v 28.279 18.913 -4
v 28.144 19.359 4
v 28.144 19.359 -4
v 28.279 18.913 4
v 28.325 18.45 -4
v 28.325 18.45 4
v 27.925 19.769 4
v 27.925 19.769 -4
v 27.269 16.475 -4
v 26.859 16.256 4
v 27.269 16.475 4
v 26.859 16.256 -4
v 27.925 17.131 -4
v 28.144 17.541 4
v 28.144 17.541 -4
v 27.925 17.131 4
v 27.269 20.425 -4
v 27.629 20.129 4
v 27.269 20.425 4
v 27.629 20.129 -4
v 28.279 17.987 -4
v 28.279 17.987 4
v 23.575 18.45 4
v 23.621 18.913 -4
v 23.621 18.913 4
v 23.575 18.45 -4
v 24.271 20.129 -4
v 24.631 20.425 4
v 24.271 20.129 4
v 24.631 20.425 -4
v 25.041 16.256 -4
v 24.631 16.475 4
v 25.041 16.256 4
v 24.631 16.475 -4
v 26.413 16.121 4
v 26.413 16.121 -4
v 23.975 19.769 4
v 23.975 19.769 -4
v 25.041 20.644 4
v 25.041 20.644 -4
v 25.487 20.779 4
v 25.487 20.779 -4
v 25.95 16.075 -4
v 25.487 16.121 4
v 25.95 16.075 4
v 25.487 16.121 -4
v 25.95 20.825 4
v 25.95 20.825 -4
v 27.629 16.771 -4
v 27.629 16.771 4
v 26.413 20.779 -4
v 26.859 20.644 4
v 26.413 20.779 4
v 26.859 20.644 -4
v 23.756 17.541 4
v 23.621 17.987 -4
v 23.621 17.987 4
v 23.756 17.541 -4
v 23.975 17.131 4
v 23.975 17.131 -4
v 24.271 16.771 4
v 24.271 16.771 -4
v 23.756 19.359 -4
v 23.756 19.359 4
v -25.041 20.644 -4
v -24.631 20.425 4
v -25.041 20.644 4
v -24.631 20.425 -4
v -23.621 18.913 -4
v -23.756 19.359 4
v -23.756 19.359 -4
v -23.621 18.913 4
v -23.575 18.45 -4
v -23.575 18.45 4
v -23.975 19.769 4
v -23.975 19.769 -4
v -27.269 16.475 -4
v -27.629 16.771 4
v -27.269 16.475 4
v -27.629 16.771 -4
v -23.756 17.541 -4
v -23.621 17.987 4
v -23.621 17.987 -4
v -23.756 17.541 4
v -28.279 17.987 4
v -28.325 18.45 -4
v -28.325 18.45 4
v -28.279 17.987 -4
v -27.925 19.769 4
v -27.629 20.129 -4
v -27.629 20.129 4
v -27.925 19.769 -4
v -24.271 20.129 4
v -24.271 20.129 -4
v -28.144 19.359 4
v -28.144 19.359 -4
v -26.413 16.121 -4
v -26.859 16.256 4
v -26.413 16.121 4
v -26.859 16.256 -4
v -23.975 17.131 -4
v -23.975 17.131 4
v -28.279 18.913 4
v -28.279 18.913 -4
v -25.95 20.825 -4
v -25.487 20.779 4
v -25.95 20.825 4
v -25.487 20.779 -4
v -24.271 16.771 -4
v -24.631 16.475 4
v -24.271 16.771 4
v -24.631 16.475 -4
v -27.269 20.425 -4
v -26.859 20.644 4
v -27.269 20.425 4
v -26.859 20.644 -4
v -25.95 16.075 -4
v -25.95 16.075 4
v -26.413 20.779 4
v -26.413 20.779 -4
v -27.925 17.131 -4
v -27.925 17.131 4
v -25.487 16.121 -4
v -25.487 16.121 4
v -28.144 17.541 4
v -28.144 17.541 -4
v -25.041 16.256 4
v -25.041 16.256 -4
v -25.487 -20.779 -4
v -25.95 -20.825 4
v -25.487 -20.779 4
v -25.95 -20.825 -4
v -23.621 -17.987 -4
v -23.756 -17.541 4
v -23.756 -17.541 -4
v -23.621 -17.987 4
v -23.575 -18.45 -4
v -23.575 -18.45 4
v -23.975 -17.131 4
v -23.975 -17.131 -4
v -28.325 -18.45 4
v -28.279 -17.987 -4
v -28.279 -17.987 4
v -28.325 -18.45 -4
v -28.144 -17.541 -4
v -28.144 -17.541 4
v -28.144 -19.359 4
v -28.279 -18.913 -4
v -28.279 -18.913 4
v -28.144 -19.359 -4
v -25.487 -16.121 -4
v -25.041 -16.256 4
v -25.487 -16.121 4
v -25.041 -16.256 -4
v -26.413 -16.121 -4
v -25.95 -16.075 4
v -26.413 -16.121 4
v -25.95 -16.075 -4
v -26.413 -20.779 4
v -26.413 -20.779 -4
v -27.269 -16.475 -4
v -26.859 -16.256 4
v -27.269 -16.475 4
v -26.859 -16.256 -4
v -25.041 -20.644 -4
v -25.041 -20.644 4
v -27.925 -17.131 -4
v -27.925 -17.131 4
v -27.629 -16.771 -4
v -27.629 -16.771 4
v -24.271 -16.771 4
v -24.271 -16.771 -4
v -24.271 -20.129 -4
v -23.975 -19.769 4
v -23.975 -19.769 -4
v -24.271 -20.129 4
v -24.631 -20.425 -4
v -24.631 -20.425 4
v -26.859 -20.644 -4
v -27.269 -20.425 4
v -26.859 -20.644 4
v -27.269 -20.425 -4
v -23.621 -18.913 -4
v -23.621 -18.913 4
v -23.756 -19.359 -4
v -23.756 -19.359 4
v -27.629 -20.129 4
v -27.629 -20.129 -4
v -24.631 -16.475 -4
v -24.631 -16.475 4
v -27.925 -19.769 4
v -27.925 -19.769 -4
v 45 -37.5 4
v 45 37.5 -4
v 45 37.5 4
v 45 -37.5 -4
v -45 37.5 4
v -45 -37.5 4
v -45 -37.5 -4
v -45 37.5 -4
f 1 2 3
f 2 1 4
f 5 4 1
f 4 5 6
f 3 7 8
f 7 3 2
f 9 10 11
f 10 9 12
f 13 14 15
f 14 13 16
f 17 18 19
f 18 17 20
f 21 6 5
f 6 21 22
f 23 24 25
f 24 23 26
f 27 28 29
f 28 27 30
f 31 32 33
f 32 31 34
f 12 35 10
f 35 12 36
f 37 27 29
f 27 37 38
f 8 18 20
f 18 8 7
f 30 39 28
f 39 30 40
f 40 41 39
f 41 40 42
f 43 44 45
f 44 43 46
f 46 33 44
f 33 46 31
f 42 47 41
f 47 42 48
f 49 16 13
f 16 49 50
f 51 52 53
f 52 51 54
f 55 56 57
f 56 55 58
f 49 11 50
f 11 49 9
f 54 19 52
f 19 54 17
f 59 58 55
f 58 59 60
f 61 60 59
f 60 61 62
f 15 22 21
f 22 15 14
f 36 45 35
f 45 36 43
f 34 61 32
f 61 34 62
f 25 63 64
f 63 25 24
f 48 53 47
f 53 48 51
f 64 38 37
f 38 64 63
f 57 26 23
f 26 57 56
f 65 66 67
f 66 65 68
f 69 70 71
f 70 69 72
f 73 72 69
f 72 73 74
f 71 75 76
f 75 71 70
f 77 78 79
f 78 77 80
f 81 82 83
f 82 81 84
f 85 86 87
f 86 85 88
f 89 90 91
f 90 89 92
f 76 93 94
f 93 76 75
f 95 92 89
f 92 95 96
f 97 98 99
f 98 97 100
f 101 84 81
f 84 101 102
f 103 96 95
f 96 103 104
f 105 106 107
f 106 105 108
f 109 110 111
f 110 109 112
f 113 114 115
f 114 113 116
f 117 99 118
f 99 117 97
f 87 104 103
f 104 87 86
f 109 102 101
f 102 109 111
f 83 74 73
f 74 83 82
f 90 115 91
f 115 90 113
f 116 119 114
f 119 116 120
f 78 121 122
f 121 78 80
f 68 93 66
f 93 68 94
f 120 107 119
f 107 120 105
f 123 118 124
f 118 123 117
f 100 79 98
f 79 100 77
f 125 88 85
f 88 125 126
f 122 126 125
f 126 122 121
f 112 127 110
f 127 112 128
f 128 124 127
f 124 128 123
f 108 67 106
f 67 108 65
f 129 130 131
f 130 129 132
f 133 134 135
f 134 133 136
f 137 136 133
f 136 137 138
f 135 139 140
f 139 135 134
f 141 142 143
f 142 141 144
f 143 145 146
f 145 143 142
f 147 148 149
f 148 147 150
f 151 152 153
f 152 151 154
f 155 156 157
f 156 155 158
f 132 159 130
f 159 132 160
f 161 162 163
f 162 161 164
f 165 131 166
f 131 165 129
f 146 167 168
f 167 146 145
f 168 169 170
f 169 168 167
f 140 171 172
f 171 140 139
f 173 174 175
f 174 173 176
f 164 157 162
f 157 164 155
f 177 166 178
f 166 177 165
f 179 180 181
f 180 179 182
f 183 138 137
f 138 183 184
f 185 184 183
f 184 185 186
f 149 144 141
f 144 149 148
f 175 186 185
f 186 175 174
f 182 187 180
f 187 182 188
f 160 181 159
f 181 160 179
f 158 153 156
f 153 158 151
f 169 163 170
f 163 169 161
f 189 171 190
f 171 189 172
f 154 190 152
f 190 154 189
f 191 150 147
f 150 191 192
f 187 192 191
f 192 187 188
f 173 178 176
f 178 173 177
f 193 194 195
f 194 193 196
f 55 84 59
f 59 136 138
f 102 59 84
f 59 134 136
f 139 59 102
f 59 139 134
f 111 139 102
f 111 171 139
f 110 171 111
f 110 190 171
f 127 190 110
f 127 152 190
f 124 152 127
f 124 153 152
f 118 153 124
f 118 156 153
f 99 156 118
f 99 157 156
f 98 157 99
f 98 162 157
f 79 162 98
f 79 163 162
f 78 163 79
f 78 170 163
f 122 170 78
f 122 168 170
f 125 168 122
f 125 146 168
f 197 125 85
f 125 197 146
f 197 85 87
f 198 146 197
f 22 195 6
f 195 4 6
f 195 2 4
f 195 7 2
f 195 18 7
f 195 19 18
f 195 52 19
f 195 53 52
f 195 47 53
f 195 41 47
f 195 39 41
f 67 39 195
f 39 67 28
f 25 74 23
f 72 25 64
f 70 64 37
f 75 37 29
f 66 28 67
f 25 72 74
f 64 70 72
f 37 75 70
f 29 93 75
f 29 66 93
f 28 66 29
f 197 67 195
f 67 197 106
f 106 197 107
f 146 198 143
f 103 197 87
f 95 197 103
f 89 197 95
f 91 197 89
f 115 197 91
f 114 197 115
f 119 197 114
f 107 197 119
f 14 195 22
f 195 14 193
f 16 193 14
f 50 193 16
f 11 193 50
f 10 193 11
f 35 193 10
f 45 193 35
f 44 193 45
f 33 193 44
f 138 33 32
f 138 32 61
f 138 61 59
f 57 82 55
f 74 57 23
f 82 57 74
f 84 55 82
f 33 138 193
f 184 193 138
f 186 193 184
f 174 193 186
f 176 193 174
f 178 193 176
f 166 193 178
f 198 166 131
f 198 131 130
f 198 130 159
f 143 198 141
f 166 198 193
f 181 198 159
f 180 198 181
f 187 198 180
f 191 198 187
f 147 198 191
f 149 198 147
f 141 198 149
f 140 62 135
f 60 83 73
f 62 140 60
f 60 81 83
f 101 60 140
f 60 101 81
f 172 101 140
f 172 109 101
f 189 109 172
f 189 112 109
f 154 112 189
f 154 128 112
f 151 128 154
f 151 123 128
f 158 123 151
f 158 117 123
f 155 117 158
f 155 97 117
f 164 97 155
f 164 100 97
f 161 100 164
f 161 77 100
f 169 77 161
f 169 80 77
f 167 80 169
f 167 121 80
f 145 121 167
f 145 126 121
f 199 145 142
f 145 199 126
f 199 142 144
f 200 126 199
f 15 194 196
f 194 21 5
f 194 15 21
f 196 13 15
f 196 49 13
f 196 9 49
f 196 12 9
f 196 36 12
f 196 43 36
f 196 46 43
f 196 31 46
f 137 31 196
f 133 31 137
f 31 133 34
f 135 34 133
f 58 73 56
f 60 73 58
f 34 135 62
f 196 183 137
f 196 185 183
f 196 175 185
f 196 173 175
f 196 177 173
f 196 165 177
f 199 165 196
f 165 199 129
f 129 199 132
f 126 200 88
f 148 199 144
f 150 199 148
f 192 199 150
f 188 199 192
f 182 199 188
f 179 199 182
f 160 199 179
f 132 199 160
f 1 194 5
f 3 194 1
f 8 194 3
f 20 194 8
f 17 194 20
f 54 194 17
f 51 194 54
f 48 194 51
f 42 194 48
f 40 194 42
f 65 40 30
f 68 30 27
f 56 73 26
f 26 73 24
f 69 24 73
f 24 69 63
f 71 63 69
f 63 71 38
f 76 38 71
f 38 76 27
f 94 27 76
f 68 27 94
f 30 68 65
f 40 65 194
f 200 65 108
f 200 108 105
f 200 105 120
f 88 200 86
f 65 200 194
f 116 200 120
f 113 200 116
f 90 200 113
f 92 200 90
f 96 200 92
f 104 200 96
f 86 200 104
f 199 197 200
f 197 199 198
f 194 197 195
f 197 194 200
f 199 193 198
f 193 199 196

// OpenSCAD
$fn = 32;

// ----------------------------------------------------------------------
// Corner plate 90 x 75 x 8
// 3 holes, centres taken from the edge offset
// ----------------------------------------------------------------------

// --- parameters (mm) ---
plate = [90, 75, 8];     // overall size (x, y, z)
holes = 3;               // number of holes the drawing asks for
bore_d = 4.5;            // nominal hole diameter from the drawing
print_allowance = 0.25;  // clearance added for printing
edge = 19.05;            // hole centre offset from the plate edge

// --- derived feature positions (mm) ---
hole_d = bore_d + print_allowance;  // = 4.75   hole diameter as printed
corner_x = plate[0] / 2 - edge;     // = 25.95   corner hole X
corner_y = plate[1] / 2 - edge;     // = 18.45   corner hole Y
feature_centers = [
  [corner_x, corner_y],
  [-corner_x, corner_y],
  [-corner_x, -corner_y]
];   // hole centres the loop below drills

// plate outline, every hole drilled through with the same cutters
difference() {
  cube(plate, center = true);
  for (centre = feature_centers)
    translate([centre[0], centre[1], 0])
      cylinder(d = hole_d, h = plate[2] + 2, center = true);
}
